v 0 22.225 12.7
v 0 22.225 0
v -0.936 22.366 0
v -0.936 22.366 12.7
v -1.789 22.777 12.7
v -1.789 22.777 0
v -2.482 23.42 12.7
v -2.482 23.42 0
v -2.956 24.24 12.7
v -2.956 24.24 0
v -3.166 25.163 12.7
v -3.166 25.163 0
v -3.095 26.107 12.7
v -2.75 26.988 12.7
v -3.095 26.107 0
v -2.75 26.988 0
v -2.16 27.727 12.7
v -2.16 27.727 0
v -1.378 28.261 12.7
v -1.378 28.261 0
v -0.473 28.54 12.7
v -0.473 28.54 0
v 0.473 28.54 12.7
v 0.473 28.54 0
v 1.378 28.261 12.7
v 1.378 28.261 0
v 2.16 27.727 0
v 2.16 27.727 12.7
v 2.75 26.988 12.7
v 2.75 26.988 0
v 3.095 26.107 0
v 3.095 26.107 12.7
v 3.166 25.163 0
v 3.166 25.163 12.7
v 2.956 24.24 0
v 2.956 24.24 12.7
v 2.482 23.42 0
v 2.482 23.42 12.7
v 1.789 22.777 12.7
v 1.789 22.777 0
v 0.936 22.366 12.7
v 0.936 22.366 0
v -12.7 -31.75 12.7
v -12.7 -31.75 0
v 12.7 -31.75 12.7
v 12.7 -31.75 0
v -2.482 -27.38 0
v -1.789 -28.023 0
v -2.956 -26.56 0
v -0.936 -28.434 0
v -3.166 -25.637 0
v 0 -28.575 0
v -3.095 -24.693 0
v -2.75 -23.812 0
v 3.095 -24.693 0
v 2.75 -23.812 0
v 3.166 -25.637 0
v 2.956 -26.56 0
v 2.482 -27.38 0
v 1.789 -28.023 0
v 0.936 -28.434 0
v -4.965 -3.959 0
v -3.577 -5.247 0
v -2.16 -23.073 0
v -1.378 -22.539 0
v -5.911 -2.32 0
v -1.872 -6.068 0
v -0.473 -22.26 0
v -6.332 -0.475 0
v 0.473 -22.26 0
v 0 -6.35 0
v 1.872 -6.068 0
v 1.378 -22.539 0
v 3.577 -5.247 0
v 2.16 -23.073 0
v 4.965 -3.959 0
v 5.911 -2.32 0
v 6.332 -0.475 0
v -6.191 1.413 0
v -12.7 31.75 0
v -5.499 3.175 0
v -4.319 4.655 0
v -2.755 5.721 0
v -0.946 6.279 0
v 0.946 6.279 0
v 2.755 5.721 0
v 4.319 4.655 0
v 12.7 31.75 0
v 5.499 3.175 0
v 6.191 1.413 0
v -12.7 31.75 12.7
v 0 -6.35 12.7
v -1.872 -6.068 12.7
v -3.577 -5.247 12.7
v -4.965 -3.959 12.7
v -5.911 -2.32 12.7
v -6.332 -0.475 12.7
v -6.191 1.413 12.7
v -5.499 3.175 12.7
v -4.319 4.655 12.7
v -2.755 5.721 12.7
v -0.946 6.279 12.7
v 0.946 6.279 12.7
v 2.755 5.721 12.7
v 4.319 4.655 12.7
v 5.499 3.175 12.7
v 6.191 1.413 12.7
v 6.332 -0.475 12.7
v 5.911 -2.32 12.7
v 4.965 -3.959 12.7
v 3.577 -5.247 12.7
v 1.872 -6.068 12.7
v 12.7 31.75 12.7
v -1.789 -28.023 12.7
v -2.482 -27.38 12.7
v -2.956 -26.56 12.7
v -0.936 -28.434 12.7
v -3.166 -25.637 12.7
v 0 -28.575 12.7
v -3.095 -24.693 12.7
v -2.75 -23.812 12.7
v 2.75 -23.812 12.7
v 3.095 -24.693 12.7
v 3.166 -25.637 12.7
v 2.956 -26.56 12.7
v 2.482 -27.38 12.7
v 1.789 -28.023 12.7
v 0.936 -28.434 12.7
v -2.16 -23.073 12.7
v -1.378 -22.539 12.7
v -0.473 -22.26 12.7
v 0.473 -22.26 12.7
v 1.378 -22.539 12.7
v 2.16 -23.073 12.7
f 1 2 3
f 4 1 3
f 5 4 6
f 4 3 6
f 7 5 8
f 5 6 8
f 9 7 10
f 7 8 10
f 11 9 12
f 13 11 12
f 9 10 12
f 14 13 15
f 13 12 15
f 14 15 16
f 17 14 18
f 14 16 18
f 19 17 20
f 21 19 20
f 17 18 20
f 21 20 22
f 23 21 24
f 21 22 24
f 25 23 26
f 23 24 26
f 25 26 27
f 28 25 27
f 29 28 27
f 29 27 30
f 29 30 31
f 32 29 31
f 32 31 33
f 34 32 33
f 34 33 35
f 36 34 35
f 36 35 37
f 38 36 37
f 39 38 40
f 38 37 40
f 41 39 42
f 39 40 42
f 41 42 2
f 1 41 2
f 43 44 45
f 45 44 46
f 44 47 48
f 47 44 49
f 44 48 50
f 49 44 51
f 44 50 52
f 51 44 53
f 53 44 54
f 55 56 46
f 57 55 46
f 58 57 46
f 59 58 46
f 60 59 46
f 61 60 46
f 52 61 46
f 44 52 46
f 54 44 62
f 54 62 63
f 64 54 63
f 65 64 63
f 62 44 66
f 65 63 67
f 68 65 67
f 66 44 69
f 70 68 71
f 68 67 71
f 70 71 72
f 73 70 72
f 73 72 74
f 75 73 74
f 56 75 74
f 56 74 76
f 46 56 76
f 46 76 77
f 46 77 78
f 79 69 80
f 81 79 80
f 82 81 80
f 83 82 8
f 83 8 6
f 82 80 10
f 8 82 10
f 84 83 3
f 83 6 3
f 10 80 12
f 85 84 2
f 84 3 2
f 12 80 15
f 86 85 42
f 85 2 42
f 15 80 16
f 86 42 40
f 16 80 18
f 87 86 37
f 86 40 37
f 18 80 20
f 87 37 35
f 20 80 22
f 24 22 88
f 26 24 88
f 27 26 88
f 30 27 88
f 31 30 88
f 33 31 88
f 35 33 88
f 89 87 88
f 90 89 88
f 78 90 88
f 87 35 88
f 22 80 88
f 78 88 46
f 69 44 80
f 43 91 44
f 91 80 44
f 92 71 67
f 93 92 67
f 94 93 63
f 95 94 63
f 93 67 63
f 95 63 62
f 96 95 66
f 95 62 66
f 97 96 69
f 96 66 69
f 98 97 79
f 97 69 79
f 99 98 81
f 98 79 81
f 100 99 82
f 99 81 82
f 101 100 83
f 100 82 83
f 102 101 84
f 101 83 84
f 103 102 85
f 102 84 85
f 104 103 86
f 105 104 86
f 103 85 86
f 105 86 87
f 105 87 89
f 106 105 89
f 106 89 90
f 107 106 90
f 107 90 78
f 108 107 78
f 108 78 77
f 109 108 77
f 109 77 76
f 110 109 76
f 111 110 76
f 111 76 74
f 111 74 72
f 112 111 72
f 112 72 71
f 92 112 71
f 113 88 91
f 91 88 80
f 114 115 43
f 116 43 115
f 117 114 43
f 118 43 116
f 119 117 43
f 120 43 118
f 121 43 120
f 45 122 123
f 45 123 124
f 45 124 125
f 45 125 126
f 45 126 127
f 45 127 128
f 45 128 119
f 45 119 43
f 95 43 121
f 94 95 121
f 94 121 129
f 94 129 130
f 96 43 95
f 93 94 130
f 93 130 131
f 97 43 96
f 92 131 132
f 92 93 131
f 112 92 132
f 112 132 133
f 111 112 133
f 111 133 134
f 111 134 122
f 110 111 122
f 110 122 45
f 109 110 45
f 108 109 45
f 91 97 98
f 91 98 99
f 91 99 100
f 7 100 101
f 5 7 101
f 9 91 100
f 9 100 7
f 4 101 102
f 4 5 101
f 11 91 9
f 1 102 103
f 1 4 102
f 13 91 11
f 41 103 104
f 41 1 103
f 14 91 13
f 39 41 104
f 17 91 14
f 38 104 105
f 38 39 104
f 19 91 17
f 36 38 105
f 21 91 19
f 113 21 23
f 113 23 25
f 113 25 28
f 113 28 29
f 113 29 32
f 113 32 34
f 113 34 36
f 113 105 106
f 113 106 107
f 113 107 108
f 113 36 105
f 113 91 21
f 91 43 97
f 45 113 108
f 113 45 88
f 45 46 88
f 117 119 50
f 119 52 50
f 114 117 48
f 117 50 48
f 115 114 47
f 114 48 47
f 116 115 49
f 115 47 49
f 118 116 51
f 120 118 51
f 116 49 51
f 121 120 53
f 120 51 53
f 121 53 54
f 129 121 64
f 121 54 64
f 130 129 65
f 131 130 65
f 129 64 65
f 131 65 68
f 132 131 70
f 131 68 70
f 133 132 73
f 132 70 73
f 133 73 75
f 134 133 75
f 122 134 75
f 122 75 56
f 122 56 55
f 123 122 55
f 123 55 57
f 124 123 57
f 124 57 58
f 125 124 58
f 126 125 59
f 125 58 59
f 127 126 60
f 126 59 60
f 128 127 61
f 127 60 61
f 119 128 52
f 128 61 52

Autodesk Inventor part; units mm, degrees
ref_plane "YZ Plane" through (0, 0, 0) normal (1, 0, 0) x (0, 1, 0)
ref_plane "XZ Plane" through (0, 0, 0) normal (0, 1, 0) x (-1, 0, 0)
ref_plane "XY Plane" through (0, 0, 0) normal (0, 0, 1) x (1, 0, 0)
sketch "Sketch1" plane through (0, 0, 0) normal (0, 0, 1) x (1, 0, 0)
  line L0 (-12.7, -31.75) -> (12.7, -31.75)
  line L1 (12.7, -31.75) -> (12.7, 31.75)
  line L2 (12.7, 31.75) -> (-12.7, 31.75)
  line L3 (-12.7, 31.75) -> (-12.7, -31.75)
  line L4 (-12.7, -31.75) -> (12.7, 31.75) construction
  line L5 (12.7, -31.75) -> (-12.7, 31.75) construction
  point P0 (0, 0)
  dimension "d0" = 25.4
  dimension "d1" = 63.5
extrude "Extrusion1" add sketch "Sketch1" along normal blind 12.7
sketch "Sketch2" plane through (0, 0, 12.7) normal (0, 0, 1) x (1, 0, 0)
  line L0 (-12.7, -31.75) -> (12.7, -31.75) projected
  line L1 (12.7, 31.75) -> (-12.7, 31.75) projected
  line L2 (-12.7, 31.75) -> (-12.7, -31.75) projected
  line L3 (0, 31.75) -> (0, 25.4)
  line L4 (0, -31.75) -> (0, -25.4)
  point P0 (0, 0)
  dimension "d4" = 6.35
  dimension "d5" = 6.35
hole "Hole2" at (0, 25.4, 12.7) at (0, -25.4, 12.7) direction (0, 0, -1) diameter 6.35 end through all
sketch "Sketch3" plane through (0, 0, 12.7) normal (0, 0, 1) x (1, 0, 0)
  point P0 (0, 0)
hole "Hole3" at (0, 0, 12.7) direction (0, 0, -1) diameter 12.7 end through all
properties part number "3 in bar"
